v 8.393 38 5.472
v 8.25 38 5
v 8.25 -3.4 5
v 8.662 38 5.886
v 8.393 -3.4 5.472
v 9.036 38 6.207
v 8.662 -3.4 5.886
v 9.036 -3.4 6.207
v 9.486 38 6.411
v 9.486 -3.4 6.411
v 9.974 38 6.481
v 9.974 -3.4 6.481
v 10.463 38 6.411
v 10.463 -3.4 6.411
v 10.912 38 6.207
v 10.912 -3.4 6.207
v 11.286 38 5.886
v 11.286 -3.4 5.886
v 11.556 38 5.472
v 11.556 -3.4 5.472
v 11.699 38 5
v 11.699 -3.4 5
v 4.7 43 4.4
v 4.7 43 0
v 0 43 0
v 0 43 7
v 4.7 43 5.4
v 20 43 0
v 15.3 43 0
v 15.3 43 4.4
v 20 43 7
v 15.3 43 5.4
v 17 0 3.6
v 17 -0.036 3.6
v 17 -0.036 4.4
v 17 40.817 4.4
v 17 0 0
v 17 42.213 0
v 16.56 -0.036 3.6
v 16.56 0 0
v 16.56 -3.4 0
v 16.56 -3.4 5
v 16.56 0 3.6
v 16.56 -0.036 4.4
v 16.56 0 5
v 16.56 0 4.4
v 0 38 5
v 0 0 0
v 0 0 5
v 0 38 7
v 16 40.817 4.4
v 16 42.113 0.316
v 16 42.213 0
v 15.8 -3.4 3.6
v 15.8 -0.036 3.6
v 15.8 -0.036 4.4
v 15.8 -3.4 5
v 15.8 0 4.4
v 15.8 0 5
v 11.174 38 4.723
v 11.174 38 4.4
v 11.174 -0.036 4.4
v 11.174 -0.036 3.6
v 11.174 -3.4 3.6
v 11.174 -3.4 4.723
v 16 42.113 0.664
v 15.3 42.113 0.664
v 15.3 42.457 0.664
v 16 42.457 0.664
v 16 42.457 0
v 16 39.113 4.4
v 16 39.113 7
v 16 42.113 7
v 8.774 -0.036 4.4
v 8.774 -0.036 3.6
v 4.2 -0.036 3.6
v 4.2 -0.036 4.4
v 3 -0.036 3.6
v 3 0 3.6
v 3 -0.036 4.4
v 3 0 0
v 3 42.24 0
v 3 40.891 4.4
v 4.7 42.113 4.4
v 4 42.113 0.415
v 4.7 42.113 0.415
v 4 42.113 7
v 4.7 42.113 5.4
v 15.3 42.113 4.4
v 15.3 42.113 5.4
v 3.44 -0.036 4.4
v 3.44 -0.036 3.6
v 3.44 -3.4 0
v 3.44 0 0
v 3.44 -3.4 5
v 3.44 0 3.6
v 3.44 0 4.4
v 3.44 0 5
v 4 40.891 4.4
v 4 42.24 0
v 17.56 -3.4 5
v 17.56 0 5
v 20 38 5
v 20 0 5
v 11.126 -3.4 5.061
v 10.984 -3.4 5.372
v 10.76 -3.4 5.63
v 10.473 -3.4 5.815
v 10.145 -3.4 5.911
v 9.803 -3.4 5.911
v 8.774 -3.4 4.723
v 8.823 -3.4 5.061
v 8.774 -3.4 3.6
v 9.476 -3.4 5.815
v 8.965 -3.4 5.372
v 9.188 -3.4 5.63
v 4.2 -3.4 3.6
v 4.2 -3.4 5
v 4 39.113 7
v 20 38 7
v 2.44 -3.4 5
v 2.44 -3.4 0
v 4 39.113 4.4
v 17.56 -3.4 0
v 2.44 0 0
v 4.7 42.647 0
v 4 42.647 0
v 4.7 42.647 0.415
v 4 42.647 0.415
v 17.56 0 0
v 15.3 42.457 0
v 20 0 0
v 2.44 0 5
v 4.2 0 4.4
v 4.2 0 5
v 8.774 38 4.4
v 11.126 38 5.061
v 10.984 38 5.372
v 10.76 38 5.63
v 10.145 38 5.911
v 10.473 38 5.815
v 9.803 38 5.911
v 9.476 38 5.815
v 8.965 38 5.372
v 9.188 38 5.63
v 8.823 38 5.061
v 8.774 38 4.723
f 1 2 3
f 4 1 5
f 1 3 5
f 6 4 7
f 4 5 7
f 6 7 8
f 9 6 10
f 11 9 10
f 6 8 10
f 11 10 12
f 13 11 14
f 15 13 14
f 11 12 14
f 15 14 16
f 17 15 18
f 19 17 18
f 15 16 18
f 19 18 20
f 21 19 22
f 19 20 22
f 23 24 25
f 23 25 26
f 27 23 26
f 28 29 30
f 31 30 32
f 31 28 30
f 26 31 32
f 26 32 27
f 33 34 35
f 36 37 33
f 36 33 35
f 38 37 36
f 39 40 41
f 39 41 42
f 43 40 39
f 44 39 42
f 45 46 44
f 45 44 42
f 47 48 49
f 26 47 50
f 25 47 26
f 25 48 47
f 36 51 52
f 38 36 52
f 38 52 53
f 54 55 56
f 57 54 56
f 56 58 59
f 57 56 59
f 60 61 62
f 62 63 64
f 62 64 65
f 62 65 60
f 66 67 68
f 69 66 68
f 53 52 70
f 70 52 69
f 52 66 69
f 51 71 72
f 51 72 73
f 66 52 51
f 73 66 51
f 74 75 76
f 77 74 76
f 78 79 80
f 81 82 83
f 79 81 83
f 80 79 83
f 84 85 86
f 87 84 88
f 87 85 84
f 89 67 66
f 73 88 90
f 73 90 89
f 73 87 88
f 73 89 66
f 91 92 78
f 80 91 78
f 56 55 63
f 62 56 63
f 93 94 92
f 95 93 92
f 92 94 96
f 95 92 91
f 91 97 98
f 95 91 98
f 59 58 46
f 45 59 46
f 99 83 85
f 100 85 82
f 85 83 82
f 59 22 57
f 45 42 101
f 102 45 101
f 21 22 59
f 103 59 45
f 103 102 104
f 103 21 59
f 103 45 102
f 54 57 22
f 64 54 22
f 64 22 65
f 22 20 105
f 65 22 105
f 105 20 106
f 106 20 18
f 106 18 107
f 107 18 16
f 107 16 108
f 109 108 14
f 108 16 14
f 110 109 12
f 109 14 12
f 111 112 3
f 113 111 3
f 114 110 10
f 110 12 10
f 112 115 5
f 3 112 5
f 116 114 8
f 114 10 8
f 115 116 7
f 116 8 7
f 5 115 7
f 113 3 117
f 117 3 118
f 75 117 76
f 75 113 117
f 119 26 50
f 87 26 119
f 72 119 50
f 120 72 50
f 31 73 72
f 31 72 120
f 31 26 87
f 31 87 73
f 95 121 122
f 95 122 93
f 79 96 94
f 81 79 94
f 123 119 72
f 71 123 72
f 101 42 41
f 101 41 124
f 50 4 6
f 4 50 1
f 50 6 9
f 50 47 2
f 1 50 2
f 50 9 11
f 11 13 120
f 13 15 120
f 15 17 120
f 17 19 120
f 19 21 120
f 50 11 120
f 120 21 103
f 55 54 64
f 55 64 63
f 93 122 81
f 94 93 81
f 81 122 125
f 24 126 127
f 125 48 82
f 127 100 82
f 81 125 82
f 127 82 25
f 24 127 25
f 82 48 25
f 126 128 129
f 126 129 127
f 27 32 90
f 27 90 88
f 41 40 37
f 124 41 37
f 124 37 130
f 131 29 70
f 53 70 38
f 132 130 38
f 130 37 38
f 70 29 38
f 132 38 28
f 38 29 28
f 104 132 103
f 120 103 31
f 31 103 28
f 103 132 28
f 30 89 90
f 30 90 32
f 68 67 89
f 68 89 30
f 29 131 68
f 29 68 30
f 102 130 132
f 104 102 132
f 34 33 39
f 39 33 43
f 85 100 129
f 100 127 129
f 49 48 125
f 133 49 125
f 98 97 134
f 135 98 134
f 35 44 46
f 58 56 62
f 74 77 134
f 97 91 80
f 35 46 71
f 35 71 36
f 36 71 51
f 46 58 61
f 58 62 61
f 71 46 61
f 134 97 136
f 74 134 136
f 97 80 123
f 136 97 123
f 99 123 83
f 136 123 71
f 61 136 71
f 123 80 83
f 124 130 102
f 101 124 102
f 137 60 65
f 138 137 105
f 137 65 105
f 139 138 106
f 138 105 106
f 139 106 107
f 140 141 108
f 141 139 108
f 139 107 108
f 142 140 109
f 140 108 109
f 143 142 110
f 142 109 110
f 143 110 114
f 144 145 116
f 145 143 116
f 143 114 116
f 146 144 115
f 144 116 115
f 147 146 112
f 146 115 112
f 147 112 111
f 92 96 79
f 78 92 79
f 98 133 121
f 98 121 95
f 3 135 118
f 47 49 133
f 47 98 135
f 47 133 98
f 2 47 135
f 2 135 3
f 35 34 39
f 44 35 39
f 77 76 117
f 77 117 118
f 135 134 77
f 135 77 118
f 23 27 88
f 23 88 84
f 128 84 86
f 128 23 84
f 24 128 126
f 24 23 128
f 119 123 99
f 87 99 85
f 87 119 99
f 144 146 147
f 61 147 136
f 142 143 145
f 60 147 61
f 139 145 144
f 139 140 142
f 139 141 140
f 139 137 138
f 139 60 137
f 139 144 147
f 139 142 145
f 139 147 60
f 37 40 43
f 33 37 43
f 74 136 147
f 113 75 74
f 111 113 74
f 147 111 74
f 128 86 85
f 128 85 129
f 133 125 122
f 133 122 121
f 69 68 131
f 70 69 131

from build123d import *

# Parameters (mm, degrees)
SKETCH2_W            = 20
SKETCH2_H            = 43
BOSS_EXTRUDE1_DEPTH  = 5
SKETCH3_W            = 20
SKETCH3_H            = 5
BOSS_EXTRUDE2_DEPTH  = 2
SKETCH4_W            = 1
SKETCH4_H            = 5
BOSS_EXTRUDE4_DEPTH  = 3.4
SKETCH6_W            = 11.6
SKETCH6_H            = 5
BOSS_EXTRUDE5_DEPTH  = 3.4
SKETCH8_W            = 12.4
SKETCH8_H            = 3.6
CUT_EXTRUDE1_DEPTH   = 52.009410896
BOSS_EXTRUDE6_DEPTH  = 41.4
SKETCH10_R           = 1.2
CUT_EXTRUDE2_DEPTH   = 41.4
SKETCH12_W           = 2.4
SKETCH12_H           = 1.123326967
CUT_EXTRUDE3_DEPTH   = 41.4
SKETCH14_W           = 12
SKETCH14_H           = 3
CUT_EXTRUDE5_DEPTH   = 3.4
SKETCH15_W           = 3.6
SKETCH15_H           = 43
CUT_EXTRUDE6_DEPTH   = 0.8
SKETCH16_W           = 3.6
SKETCH16_H           = 43
CUT_EXTRUDE7_DEPTH   = 0.8
SKETCH17_W           = 14
SKETCH17_H           = 43.036158128
CUT_EXTRUDE8_DEPTH   = 0.8
SKETCH18_W           = 4.4
SKETCH18_H           = 0.7
BOSS_EXTRUDE7_DEPTH  = 0.7
SKETCH19_W           = 4.4
SKETCH19_H           = 0.7
BOSS_EXTRUDE8_DEPTH  = 0.7
SKETCH21_W           = 4.4
SKETCH21_H           = 0.7
BOSS_EXTRUDE10_DEPTH = 1
SKETCH22_W           = 4.4
SKETCH22_H           = 0.7
BOSS_EXTRUDE11_DEPTH = 1
SKETCH23_W           = 1.7
SKETCH23_H           = 4.4
BOSS_EXTRUDE12_DEPTH = 2
CUT_EXTRUDE9_REACH   = 48.175
CUT_EXTRUDE10_REACH  = 48.175
CUT_EXTRUDE11_REACH  = 48.175
CUT_EXTRUDE12_REACH  = 48.175
CUT_EXTRUDE17_START  = -1.7
CUT_EXTRUDE17_DEPTH  = 1.7
CUT_EXTRUDE18_REACH  = 48.175
BOSS_EXTRUDE13_DEPTH = 41.4
SKETCH35_W           = 0.7
SKETCH35_H           = 1.29581549
SKETCH35_H_2         = 1.222235382
CUT_EXTRUDE19_DEPTH  = 10
CUT_EXTRUDE20_DEPTH  = 0.7
CUT_EXTRUDE21_DEPTH  = 0.7
SKETCH38_W           = 10.6
SKETCH38_H           = 0.887130053
CUT_EXTRUDE22_DEPTH  = 1


with BuildPart() as part:
    # Sketch2 → Boss-Extrude1 (new body)
    with BuildSketch(Plane.XY):
        with Locations((10, 21.5)):
            Rectangle(SKETCH2_W, SKETCH2_H)
    extrude(amount=BOSS_EXTRUDE1_DEPTH)

    # Sketch3 → Boss-Extrude2 (add)
    with BuildSketch(Plane.XY.offset(5)):
        with Locations((10, 40.5)):
            Rectangle(SKETCH3_W, SKETCH3_H)
    extrude(amount=BOSS_EXTRUDE2_DEPTH)

    # Sketch4 → Boss-Extrude4 (add)
    with BuildSketch(Plane.XZ):
        with Locations((2.94, 2.5)):
            Rectangle(SKETCH4_W, SKETCH4_H)
        with Locations((17.06, 2.5)):
            Rectangle(SKETCH4_W, SKETCH4_H)
    extrude(amount=BOSS_EXTRUDE4_DEPTH)

    # Sketch6 → Boss-Extrude5 (add)
    with BuildSketch(Plane.XZ):
        with Locations((10, 2.5)):
            Rectangle(SKETCH6_W, SKETCH6_H)
    extrude(amount=BOSS_EXTRUDE5_DEPTH)

    # Sketch8 → Cut-Extrude1 (cut, through all)
    with BuildSketch(Plane(origin=(0, 43, 0), x_dir=(1, 0, 0), z_dir=(0, 1, 0))):
        with Locations((10, -1.8)):
            Rectangle(SKETCH8_W, SKETCH8_H)
    extrude(amount=-CUT_EXTRUDE1_DEPTH, mode=Mode.SUBTRACT)

    # Sketch9 → Boss-Extrude6 (add)
    with BuildSketch(Plane.XZ.offset(3.4)):
        with BuildLine():
            Line((8.5, 5), (11.448526434, 5))
            ThreePointArc((11.448526434, 5), (9.974263217, 6.223326967), (8.5, 5))
        make_face()
    extrude(amount=-BOSS_EXTRUDE6_DEPTH)

    # Sketch10 → Cut-Extrude2 (cut)
    with BuildSketch(Plane.XZ.offset(3.4)):
        with Locations((9.974263217, 4.723326967)):
            Circle(SKETCH10_R)
    extrude(amount=-CUT_EXTRUDE2_DEPTH, mode=Mode.SUBTRACT)

    # Sketch12 → Cut-Extrude3 (cut)
    with BuildSketch(Plane.XZ.offset(3.4)):
        with Locations((9.974263217, 4.161663483)):
            Rectangle(SKETCH12_W, SKETCH12_H)
    extrude(amount=-CUT_EXTRUDE3_DEPTH, mode=Mode.SUBTRACT)

    # Sketch14 → Cut-Extrude5 (cut)
    with BuildSketch(Plane.XY.offset(7)):
        with Locations((10, 40.612869947)):
            Rectangle(SKETCH14_W, SKETCH14_H)
    extrude(amount=-CUT_EXTRUDE5_DEPTH, mode=Mode.SUBTRACT)

    # Sketch15 → Cut-Extrude6 (cut)
    with BuildSketch(Plane(origin=(3.8, 0, 0), x_dir=(0, 0, -1), z_dir=(1, 0, 0))):
        with Locations((-1.8, 21.5)):
            Rectangle(SKETCH15_W, SKETCH15_H)
    extrude(amount=-CUT_EXTRUDE6_DEPTH, mode=Mode.SUBTRACT)

    # Sketch16 → Cut-Extrude7 (cut)
    with BuildSketch(Plane.ZY.offset(-16.2)):
        with Locations((1.8, 21.5)):
            Rectangle(SKETCH16_W, SKETCH16_H)
    extrude(amount=-CUT_EXTRUDE7_DEPTH, mode=Mode.SUBTRACT)

    # Sketch17 → Cut-Extrude8 (cut)
    with BuildSketch(Plane(origin=(0, 0, 3.6), x_dir=(-1, 0, 0), z_dir=(0, 0, -1))):
        with Locations((-10, 21.481920936)):
            Rectangle(SKETCH17_W, SKETCH17_H)
    extrude(amount=-CUT_EXTRUDE8_DEPTH, mode=Mode.SUBTRACT)

    # Sketch18 → Boss-Extrude7 (add)
    with BuildSketch(Plane.ZY.offset(-17)):
        with Locations((2.2, 42.65)):
            Rectangle(SKETCH18_W, SKETCH18_H)
    extrude(amount=BOSS_EXTRUDE7_DEPTH)

    # Sketch19 → Boss-Extrude8 (add)
    with BuildSketch(Plane(origin=(3, 0, 0), x_dir=(0, 0, -1), z_dir=(1, 0, 0))):
        with Locations((-2.2, 42.65)):
            Rectangle(SKETCH19_W, SKETCH19_H)
    extrude(amount=BOSS_EXTRUDE8_DEPTH)

    # Sketch21 → Boss-Extrude10 (add)
    with BuildSketch(Plane(origin=(3.7, 0, 0), x_dir=(0, 0, -1), z_dir=(1, 0, 0))):
        with Locations((-2.2, 42.65)):
            Rectangle(SKETCH21_W, SKETCH21_H)
    extrude(amount=BOSS_EXTRUDE10_DEPTH)

    # Sketch22 → Boss-Extrude11 (add)
    with BuildSketch(Plane.ZY.offset(-16.3)):
        with Locations((2.2, 42.65)):
            Rectangle(SKETCH22_W, SKETCH22_H)
    extrude(amount=BOSS_EXTRUDE11_DEPTH)

    # Sketch23 → Boss-Extrude12 (add)
    with BuildSketch(Plane.XZ.offset(-42.3)):
        with Locations((16.15, 2.2)):
            Rectangle(SKETCH23_W, SKETCH23_H)
        with Locations((3.85, 2.2)):
            Rectangle(SKETCH23_W, SKETCH23_H)
    extrude(amount=BOSS_EXTRUDE12_DEPTH)

    # Cut-Extrude9: up to this face of the body (flat: up to its plane)
    cut_extrude9_end = Plane(part.part.faces().sort_by_distance((17, 20.146710485, 2.200293589))[0])
    # Sketch24 → Cut-Extrude9 (cut, up to the picked face)
    with BuildSketch(Plane.ZY.offset(-15.3), mode=Mode.PRIVATE) as cut_extrude9_sk1:
        Polygon((0, 40.3), (0, 41.65), (4.4, 40.3), align=None)
    cut_extrude9_tool1 = split(extrude(cut_extrude9_sk1.sketch, amount=-CUT_EXTRUDE9_REACH, mode=Mode.PRIVATE), bisect_by=cut_extrude9_end, keep=Keep.BOTH, mode=Mode.PRIVATE)
    add(cut_extrude9_tool1.solids().sort_by(Axis((15.3, 40.75, 1.466667), (1, 0, 0)))[0], mode=Mode.SUBTRACT)

    # Cut-Extrude10: up to this face of the body (flat: up to its plane)
    cut_extrude10_end = Plane(part.part.faces().sort_by_distance((17, 20.486063491, 2.188210154))[0])
    # Sketch25 → Cut-Extrude10 (cut, up to the picked face)
    with BuildSketch(Plane.ZY.offset(-15.3), mode=Mode.PRIVATE) as cut_extrude10_sk1:
        Polygon((0, 41.65), (0, 41.890531127), (0, 41.963142854), (4.4, 40.567054457), (4.4, 40.3), align=None)
    cut_extrude10_tool1 = split(extrude(cut_extrude10_sk1.sketch, amount=-CUT_EXTRUDE10_REACH, mode=Mode.PRIVATE), bisect_by=cut_extrude10_end, keep=Keep.BOTH, mode=Mode.PRIVATE)
    add(cut_extrude10_tool1.solids().sort_by(Axis((15.3, 41.138227, 2.141747), (1, 0, 0)))[0], mode=Mode.SUBTRACT)

    # Cut-Extrude11: up to this face of the body (flat: up to its plane)
    cut_extrude11_end = Plane(part.part.faces().sort_by_distance((3, 20.146710485, 2.200293589))[0])
    # Sketch26 → Cut-Extrude11 (cut, up to the picked face)
    with BuildSketch(Plane(origin=(4.7, 0, 0), x_dir=(0, 0, -1), z_dir=(1, 0, 0)), mode=Mode.PRIVATE) as cut_extrude11_sk1:
        Polygon((0, 40.3), (0, 41.65), (-4.4, 40.3), align=None)
    cut_extrude11_tool1 = split(extrude(cut_extrude11_sk1.sketch, amount=-CUT_EXTRUDE11_REACH, mode=Mode.PRIVATE), bisect_by=cut_extrude11_end, keep=Keep.BOTH, mode=Mode.PRIVATE)
    add(cut_extrude11_tool1.solids().sort_by(Axis((4.7, 40.75, 1.466667), (-1, 0, 0)))[0], mode=Mode.SUBTRACT)

    # Cut-Extrude12: up to this face of the body (flat: up to its plane)
    cut_extrude12_end = Plane(part.part.faces().sort_by_distance((3, 20.486063491, 2.188210154))[0])
    # Sketch27 → Cut-Extrude12 (cut, up to the picked face)
    with BuildSketch(Plane(origin=(4.7, 0, 0), x_dir=(0, 0, -1), z_dir=(1, 0, 0)), mode=Mode.PRIVATE) as cut_extrude12_sk1:
        Polygon((-4.4, 40.3), (-4.4, 40.64), (0, 41.99), (0, 41.65), align=None)
    cut_extrude12_tool1 = split(extrude(cut_extrude12_sk1.sketch, amount=-CUT_EXTRUDE12_REACH, mode=Mode.PRIVATE), bisect_by=cut_extrude12_end, keep=Keep.BOTH, mode=Mode.PRIVATE)
    add(cut_extrude12_tool1.solids().sort_by(Axis((4.7, 41.145, 2.2), (-1, 0, 0)))[0], mode=Mode.SUBTRACT)

    # Sketch32 → Cut-Extrude17 (cut)
    with BuildSketch(Plane(origin=(4.7, 0, 0), x_dir=(0, 0, -1), z_dir=(1, 0, 0)).offset(CUT_EXTRUDE17_START)):
        Polygon((-4.4, 40.64), (-4.4, 40.890634565), (0, 42.24), (0, 41.99), align=None)
    extrude(amount=CUT_EXTRUDE17_DEPTH, mode=Mode.SUBTRACT)

    # Cut-Extrude18: up to this face of the body (flat: up to its plane)
    cut_extrude18_end = Plane(part.part.faces().sort_by_distance((17, 20.631227586, 2.187883566))[0])
    # Sketch33 → Cut-Extrude18 (cut, up to the picked face)
    with BuildSketch(Plane.ZY.offset(-15.3), mode=Mode.PRIVATE) as cut_extrude18_sk1:
        Polygon((4.4, 40.567054457), (4.4, 40.817054457), (0, 42.213142854), (0, 41.963142854), align=None)
    cut_extrude18_tool1 = split(extrude(cut_extrude18_sk1.sketch, amount=-CUT_EXTRUDE18_REACH, mode=Mode.PRIVATE), bisect_by=cut_extrude18_end, keep=Keep.BOTH, mode=Mode.PRIVATE)
    add(cut_extrude18_tool1.solids().sort_by(Axis((15.3, 41.390099, 2.2), (1, 0, 0)))[0], mode=Mode.SUBTRACT)

    # Sketch34 → Boss-Extrude13 (add)
    with BuildSketch(Plane.XZ.offset(3.4)):
        with BuildLine():
            Line((8.5, 5), (8.25, 5))
            ThreePointArc((8.25, 5), (9.974263217, 6.480805911), (11.698526434, 5))
            Line((11.698526434, 5), (11.448526434, 5))
            ThreePointArc((11.448526434, 5), (9.974263217, 6.223326967), (8.5, 5))
        make_face()
    extrude(amount=-BOSS_EXTRUDE13_DEPTH)

    # Sketch35 → Cut-Extrude19 (cut)
    with BuildSketch(Plane.XY.offset(4.4)):
        with Locations((15.65, 41.464962202)):
            Rectangle(SKETCH35_W, SKETCH35_H)
        with Locations((4.35, 41.501752256)):
            Rectangle(SKETCH35_W, SKETCH35_H_2)
    extrude(amount=-CUT_EXTRUDE19_DEPTH, mode=Mode.SUBTRACT)

    # Sketch36 → Cut-Extrude20 (cut)
    with BuildSketch(Plane.ZY.offset(-15.3)):
        Polygon((0, 42.213142854), (0.316026403, 42.112869947), (0.663813881, 42.112869947), (0.663813881, 42.457397345), (0, 42.457397345), align=None)
    extrude(amount=-CUT_EXTRUDE20_DEPTH, mode=Mode.SUBTRACT)

    # Sketch37 → Cut-Extrude21 (cut)
    with BuildSketch(Plane(origin=(4.7, 0, 0), x_dir=(0, 0, -1), z_dir=(1, 0, 0))):
        Polygon((0, 42.24), (-0.41454466, 42.112869947), (-0.41454466, 42.646558134), (0, 42.646558134), align=None)
    extrude(amount=-CUT_EXTRUDE21_DEPTH, mode=Mode.SUBTRACT)

    # Sketch38 → Cut-Extrude22 (cut)
    with BuildSketch(Plane(origin=(0, 0, 4.4), x_dir=(-1, 0, 0), z_dir=(0, 0, -1))):
        with Locations((-10, 42.556434974)):
            Rectangle(SKETCH38_W, SKETCH38_H)
    extrude(amount=-CUT_EXTRUDE22_DEPTH, mode=Mode.SUBTRACT)


solid = part.part
